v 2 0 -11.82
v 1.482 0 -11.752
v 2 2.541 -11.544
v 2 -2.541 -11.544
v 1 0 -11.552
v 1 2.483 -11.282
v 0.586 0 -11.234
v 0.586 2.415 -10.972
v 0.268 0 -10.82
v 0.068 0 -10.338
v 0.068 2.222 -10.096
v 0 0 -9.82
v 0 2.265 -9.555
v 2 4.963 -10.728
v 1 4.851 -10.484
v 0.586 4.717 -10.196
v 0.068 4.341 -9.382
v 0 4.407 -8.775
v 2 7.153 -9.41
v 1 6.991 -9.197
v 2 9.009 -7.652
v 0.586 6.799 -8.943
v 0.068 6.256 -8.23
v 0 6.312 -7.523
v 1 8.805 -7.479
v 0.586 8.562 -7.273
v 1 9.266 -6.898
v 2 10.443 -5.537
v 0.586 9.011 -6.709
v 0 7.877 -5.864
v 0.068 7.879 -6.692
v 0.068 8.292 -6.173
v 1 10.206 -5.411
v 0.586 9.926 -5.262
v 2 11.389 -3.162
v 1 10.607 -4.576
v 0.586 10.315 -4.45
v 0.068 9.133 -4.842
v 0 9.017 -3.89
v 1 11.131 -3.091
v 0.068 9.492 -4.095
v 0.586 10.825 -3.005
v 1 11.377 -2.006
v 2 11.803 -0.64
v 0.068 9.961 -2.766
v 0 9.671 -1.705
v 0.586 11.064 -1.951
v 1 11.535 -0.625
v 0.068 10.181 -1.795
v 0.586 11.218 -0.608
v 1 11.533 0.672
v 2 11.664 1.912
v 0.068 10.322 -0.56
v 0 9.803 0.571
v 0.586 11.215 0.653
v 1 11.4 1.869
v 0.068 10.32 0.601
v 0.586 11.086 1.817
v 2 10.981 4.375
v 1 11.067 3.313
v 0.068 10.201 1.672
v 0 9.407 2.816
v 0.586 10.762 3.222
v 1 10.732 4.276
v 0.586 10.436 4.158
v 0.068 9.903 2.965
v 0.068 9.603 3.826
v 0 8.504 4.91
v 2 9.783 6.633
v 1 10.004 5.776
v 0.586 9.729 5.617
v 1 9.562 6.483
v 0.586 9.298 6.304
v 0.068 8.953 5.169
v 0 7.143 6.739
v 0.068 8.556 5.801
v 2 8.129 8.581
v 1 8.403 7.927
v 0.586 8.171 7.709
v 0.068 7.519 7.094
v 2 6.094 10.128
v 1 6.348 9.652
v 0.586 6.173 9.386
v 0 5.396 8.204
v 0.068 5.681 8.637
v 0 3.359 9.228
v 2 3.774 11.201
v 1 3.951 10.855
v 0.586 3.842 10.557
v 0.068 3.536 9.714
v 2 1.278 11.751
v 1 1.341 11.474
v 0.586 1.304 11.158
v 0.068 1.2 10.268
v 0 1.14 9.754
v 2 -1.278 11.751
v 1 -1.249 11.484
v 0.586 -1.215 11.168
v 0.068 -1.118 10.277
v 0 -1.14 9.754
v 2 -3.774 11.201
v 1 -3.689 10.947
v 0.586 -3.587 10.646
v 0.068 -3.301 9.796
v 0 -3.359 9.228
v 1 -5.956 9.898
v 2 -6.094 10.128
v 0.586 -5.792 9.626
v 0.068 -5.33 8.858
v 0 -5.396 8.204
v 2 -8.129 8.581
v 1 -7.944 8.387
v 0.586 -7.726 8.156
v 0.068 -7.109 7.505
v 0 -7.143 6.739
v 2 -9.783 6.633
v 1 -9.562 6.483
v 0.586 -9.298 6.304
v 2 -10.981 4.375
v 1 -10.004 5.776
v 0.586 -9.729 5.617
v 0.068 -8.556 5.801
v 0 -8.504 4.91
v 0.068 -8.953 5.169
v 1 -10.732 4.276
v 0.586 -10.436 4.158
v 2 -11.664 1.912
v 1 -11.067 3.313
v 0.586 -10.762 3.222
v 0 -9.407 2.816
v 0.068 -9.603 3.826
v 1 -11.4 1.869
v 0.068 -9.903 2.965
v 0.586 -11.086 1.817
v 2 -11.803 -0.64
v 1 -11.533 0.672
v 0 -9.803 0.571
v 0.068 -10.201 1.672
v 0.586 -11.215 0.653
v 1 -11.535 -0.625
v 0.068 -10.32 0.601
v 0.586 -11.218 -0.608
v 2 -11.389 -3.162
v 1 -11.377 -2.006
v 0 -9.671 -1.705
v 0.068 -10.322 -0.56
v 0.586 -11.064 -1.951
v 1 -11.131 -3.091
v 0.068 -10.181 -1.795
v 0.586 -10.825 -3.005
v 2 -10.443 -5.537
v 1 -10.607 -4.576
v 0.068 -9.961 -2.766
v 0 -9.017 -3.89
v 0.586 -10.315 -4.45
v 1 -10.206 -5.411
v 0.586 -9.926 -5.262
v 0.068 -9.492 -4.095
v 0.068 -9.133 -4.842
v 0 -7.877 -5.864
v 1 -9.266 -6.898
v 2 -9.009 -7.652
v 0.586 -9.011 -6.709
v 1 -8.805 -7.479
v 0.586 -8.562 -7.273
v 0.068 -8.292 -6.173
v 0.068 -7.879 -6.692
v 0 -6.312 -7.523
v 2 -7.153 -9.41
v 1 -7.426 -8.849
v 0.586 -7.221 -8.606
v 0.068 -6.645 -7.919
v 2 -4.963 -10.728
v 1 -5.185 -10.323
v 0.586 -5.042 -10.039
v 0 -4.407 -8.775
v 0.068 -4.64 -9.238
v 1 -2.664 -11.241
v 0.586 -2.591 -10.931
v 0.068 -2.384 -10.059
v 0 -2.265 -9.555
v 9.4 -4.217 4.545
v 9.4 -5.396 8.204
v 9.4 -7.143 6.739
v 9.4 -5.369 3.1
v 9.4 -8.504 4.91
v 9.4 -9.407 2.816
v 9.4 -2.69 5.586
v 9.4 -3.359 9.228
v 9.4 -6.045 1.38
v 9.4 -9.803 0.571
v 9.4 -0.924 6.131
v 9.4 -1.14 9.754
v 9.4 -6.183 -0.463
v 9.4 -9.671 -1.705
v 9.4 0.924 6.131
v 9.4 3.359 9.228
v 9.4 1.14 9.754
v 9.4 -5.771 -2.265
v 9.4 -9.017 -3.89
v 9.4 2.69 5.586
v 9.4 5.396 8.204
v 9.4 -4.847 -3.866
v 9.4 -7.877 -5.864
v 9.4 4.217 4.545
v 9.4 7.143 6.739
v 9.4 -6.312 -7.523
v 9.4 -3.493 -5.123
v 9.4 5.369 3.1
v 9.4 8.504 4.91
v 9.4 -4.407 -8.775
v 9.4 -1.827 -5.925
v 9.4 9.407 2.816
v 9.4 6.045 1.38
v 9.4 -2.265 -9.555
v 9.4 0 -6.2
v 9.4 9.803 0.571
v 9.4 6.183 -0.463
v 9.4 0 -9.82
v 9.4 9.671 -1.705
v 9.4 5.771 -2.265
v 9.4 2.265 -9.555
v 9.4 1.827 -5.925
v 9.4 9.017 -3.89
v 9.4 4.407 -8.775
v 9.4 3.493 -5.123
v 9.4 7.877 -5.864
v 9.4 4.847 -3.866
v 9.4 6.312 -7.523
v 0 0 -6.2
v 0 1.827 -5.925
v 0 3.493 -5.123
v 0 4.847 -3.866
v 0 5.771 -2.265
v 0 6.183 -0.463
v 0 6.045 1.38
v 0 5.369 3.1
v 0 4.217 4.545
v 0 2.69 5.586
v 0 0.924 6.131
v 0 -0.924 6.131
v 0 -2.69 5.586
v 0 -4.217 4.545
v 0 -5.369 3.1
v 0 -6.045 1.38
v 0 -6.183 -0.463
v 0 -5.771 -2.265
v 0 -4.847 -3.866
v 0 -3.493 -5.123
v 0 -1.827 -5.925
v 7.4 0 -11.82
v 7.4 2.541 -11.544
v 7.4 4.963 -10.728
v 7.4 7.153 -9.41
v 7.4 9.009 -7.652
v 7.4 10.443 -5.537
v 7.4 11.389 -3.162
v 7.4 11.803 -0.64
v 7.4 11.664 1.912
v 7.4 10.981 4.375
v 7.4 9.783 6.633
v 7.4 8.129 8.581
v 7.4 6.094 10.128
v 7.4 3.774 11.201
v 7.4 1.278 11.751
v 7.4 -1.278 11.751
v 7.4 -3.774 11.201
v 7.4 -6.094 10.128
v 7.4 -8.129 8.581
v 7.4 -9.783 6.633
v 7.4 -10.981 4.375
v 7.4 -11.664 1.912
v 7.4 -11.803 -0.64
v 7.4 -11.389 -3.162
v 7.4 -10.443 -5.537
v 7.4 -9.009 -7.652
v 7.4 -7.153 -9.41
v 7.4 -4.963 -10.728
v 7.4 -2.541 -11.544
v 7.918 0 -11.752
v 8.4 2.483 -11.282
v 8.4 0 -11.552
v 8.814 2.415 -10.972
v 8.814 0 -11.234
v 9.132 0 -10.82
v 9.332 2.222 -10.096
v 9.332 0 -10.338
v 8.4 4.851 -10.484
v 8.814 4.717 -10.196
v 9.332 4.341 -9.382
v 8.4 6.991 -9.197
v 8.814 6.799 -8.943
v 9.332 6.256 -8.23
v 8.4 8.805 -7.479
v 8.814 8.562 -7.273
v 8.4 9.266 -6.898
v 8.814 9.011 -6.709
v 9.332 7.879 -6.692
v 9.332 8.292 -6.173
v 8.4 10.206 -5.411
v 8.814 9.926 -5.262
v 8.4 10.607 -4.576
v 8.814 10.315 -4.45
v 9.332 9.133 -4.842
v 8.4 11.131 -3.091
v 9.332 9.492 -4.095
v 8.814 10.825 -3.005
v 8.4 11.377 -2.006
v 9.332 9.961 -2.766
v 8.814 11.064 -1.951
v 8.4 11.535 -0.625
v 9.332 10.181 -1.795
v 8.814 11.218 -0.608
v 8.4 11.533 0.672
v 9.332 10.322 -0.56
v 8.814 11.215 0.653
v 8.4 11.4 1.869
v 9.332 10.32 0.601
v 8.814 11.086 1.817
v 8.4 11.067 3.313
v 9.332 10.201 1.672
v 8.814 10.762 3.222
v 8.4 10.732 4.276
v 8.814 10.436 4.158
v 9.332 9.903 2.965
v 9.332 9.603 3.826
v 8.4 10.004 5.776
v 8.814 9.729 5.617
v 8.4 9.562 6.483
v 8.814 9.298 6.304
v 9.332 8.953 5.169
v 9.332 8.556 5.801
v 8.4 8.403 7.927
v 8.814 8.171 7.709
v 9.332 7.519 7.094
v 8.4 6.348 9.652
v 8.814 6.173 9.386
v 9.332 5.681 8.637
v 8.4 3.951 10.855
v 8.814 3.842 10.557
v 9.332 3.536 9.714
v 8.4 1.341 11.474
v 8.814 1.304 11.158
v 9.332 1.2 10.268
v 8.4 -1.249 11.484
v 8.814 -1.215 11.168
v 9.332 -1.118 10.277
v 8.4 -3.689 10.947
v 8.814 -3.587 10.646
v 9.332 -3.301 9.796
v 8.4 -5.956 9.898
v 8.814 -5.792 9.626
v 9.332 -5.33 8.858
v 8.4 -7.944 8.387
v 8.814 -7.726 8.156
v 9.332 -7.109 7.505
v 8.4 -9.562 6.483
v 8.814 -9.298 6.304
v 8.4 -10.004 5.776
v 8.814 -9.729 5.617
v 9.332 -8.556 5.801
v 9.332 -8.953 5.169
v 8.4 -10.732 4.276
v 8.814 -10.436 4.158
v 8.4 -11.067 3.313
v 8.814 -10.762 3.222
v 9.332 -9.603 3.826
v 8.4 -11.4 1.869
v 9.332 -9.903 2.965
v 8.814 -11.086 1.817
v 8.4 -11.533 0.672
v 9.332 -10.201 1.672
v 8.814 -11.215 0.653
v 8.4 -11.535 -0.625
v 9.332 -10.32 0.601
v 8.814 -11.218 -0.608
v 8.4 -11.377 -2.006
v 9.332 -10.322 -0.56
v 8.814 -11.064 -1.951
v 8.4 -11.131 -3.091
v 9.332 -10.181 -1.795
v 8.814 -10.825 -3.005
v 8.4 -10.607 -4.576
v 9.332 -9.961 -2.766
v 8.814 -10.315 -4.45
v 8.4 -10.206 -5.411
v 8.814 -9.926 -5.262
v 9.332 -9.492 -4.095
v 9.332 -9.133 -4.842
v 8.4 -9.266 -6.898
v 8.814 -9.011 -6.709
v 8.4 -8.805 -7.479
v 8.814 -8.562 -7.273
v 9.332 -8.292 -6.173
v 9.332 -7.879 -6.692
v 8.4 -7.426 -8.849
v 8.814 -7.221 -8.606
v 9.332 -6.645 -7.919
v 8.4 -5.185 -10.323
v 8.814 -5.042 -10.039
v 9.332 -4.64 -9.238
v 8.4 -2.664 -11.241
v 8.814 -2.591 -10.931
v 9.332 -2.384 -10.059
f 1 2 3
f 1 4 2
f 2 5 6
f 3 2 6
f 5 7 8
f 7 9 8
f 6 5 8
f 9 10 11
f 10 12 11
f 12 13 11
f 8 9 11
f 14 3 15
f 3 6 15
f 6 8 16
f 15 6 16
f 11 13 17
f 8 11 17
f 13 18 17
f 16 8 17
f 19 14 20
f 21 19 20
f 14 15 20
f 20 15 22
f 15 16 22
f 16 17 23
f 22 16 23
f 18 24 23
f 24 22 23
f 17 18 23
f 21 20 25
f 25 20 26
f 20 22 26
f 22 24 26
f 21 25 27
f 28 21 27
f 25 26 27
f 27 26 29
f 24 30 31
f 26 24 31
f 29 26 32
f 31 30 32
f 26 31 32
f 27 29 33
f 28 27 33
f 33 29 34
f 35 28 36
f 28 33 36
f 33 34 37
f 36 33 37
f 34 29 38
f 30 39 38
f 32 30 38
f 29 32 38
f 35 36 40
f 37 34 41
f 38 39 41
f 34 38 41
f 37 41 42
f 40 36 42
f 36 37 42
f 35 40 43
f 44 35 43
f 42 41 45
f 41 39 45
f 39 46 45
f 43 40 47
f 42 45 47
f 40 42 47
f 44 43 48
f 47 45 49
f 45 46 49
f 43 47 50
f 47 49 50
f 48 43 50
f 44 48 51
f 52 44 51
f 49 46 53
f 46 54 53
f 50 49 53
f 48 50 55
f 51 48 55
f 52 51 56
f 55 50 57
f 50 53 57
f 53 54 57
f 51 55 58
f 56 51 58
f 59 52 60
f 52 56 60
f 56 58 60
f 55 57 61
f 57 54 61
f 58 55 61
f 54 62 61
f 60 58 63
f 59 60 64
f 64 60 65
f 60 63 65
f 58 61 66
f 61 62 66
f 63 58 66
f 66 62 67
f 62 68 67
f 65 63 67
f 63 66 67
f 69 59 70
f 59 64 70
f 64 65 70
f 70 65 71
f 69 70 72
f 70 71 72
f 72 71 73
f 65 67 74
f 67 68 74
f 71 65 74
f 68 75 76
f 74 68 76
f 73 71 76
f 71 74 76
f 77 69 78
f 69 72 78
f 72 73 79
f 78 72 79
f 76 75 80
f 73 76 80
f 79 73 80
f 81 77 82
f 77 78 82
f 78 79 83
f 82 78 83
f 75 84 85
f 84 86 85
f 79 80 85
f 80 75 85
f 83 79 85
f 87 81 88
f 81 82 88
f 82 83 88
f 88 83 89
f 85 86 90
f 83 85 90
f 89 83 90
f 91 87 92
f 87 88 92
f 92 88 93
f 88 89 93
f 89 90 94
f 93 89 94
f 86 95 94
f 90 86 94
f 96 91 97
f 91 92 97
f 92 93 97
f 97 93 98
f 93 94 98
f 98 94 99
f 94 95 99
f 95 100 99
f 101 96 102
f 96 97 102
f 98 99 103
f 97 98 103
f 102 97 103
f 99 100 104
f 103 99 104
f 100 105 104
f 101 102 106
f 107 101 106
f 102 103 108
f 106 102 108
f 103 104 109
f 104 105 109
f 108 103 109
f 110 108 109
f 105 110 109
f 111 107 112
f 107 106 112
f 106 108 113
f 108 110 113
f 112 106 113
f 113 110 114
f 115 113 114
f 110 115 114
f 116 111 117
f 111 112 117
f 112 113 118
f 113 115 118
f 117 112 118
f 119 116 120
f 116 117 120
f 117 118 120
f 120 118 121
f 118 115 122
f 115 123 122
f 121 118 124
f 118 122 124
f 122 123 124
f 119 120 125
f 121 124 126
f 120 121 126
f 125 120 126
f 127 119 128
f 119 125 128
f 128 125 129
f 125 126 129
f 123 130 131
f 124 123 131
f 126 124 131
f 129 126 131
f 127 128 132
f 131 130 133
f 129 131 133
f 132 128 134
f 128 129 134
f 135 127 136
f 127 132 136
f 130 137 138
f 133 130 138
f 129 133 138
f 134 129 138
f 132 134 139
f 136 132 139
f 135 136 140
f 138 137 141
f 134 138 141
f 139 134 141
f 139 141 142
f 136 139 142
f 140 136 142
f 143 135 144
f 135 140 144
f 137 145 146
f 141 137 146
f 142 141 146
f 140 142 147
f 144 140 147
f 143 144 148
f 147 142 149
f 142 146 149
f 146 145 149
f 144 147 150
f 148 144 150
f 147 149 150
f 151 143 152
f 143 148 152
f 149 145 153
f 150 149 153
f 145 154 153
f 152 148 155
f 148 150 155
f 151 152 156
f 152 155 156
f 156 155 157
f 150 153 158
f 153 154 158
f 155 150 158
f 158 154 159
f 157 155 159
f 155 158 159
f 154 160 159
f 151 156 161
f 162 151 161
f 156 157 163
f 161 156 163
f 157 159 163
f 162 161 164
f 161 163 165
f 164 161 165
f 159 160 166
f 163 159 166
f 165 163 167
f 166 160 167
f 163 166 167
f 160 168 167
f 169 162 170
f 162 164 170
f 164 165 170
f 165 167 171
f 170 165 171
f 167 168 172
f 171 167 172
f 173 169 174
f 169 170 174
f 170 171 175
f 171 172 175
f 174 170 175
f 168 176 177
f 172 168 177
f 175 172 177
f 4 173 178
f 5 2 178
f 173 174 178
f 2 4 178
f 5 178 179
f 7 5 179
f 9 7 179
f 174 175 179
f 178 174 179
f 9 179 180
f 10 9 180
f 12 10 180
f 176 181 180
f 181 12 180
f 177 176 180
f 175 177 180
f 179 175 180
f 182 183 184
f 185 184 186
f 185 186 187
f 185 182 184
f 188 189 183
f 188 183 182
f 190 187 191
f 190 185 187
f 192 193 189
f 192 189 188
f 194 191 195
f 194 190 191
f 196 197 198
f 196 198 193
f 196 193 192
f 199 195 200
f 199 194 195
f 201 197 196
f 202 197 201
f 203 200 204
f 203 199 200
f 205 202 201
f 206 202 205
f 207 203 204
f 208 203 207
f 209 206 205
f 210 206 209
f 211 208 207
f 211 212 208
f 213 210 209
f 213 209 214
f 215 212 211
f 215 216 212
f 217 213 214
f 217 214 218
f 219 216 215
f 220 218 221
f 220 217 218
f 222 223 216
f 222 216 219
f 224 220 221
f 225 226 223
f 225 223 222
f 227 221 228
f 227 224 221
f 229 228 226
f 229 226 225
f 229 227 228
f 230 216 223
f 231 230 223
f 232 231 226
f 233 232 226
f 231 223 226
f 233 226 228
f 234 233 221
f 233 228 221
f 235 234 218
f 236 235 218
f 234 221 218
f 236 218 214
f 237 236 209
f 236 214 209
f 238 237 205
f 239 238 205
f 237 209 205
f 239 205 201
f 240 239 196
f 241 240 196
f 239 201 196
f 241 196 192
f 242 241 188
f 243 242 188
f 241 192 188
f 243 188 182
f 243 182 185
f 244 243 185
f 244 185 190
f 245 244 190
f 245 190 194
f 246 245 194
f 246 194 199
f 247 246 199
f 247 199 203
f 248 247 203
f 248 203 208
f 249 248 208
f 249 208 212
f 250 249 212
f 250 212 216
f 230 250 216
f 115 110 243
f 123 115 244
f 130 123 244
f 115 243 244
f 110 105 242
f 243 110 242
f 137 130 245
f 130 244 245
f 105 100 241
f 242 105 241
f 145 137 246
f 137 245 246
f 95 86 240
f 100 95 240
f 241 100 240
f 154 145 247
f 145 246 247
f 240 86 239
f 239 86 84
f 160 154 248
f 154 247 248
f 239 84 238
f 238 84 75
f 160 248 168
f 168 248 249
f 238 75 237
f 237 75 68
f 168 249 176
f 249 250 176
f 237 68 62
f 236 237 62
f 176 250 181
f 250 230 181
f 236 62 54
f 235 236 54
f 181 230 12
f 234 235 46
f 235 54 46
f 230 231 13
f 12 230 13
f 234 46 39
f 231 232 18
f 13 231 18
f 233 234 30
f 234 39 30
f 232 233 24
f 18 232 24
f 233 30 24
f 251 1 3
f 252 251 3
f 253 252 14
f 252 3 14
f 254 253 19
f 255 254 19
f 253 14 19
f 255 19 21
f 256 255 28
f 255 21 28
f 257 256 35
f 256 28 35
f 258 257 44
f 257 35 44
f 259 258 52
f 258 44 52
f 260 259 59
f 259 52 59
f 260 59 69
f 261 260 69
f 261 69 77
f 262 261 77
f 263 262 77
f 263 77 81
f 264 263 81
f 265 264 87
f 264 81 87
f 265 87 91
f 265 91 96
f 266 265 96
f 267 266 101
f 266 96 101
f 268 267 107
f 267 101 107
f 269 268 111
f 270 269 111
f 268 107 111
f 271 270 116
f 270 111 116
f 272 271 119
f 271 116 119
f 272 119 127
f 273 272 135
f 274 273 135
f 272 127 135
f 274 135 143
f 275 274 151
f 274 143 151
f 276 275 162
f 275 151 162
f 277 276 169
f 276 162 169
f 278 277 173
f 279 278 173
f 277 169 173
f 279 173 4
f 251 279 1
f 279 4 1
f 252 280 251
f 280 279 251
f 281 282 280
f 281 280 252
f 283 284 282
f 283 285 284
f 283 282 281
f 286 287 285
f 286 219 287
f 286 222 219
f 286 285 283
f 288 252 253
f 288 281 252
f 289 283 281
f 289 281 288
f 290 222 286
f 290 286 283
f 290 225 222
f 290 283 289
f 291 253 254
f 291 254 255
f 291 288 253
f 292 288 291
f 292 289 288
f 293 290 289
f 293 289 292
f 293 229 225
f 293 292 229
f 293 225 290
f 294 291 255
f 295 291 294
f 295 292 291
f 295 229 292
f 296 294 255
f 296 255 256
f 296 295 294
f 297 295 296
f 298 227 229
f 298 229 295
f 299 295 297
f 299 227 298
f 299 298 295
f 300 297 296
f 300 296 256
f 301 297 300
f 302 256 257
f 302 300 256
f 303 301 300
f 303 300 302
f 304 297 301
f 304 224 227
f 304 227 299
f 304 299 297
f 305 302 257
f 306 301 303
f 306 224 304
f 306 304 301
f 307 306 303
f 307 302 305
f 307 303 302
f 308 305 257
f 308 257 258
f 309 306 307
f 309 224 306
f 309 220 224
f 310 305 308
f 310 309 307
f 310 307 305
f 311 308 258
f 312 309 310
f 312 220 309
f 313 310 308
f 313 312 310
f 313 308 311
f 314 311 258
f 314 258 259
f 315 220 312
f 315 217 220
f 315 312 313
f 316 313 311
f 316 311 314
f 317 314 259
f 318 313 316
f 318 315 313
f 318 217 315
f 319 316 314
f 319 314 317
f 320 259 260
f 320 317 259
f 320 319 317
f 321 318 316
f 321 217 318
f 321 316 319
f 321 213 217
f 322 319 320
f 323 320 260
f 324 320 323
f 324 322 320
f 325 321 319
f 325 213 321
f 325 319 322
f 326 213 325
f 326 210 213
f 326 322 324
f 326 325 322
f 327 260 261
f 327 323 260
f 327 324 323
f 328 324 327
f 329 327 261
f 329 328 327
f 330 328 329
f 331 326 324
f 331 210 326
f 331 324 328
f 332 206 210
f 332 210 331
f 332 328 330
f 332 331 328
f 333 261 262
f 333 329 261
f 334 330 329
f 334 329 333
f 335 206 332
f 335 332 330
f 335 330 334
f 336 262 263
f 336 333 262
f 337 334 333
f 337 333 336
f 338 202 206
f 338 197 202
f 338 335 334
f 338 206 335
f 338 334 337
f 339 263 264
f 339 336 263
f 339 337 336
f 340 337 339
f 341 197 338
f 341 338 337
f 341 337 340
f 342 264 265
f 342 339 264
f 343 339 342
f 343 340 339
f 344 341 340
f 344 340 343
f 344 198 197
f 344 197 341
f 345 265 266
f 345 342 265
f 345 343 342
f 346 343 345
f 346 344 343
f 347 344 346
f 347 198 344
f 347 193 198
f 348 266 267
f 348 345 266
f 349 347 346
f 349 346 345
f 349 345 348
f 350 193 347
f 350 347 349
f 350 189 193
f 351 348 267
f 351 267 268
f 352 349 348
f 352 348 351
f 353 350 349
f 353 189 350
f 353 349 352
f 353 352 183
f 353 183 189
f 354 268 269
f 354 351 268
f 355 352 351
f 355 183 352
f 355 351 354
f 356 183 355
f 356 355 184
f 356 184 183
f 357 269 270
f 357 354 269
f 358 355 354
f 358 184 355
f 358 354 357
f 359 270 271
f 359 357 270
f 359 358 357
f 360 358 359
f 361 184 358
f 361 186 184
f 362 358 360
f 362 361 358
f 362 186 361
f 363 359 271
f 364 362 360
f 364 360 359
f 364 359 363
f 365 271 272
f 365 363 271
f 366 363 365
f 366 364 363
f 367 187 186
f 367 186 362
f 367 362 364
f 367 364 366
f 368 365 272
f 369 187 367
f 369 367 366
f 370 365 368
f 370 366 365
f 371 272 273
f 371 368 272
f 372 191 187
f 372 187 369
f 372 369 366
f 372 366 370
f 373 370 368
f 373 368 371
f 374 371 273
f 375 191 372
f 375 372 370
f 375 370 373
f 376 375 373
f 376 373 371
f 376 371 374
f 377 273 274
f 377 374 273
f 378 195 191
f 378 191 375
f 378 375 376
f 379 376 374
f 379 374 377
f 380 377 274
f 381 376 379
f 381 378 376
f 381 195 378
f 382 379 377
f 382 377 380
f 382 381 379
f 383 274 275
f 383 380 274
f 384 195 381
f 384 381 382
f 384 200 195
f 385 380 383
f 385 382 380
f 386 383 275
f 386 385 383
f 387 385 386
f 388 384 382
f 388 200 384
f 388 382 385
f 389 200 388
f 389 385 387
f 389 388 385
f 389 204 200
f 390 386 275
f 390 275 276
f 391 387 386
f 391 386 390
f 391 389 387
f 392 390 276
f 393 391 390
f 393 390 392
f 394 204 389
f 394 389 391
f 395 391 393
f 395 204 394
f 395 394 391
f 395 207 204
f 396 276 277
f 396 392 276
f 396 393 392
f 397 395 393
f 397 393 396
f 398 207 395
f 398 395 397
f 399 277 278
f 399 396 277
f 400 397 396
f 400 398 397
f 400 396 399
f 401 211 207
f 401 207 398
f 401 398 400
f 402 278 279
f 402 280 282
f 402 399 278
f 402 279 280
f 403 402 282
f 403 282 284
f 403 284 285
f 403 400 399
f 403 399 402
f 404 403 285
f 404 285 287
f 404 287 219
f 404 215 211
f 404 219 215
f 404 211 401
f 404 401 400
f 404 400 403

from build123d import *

# Parameters (mm, degrees)
ESQUISSE1_R             = 11.82
BOSS_EXTRU_1_DEPTH      = 9.4
ESQUISSE2_R             = 6.2
ENL_V_MAT_EXTRU_1_DEPTH = 20.177716235
CONG_3_R                = 2


with BuildPart() as part:
    # Esquisse1 → Boss.-Extru.1 (new body)
    with BuildSketch(Plane(origin=(0, 0, 0), x_dir=(0, 0, -1), z_dir=(1, 0, 0))):
        Circle(ESQUISSE1_R)
    extrude(amount=BOSS_EXTRU_1_DEPTH)

    # Esquisse2 → Enlèv. mat.-Extru.1 (cut, through all)
    with BuildSketch(Plane(origin=(9.4, 0, 0), x_dir=(0, 0, -1), z_dir=(1, 0, 0))):
        Circle(ESQUISSE2_R)
    extrude(amount=-ENL_V_MAT_EXTRU_1_DEPTH, mode=Mode.SUBTRACT)

    # Congé3
    cong_3_edges = [part.edges().sort_by_distance(p)[0] for p in [
        (0, 0, 11.82),
        (9.4, 0, 11.82),
    ]]
    fillet(cong_3_edges, radius=CONG_3_R)


solid = part.part
